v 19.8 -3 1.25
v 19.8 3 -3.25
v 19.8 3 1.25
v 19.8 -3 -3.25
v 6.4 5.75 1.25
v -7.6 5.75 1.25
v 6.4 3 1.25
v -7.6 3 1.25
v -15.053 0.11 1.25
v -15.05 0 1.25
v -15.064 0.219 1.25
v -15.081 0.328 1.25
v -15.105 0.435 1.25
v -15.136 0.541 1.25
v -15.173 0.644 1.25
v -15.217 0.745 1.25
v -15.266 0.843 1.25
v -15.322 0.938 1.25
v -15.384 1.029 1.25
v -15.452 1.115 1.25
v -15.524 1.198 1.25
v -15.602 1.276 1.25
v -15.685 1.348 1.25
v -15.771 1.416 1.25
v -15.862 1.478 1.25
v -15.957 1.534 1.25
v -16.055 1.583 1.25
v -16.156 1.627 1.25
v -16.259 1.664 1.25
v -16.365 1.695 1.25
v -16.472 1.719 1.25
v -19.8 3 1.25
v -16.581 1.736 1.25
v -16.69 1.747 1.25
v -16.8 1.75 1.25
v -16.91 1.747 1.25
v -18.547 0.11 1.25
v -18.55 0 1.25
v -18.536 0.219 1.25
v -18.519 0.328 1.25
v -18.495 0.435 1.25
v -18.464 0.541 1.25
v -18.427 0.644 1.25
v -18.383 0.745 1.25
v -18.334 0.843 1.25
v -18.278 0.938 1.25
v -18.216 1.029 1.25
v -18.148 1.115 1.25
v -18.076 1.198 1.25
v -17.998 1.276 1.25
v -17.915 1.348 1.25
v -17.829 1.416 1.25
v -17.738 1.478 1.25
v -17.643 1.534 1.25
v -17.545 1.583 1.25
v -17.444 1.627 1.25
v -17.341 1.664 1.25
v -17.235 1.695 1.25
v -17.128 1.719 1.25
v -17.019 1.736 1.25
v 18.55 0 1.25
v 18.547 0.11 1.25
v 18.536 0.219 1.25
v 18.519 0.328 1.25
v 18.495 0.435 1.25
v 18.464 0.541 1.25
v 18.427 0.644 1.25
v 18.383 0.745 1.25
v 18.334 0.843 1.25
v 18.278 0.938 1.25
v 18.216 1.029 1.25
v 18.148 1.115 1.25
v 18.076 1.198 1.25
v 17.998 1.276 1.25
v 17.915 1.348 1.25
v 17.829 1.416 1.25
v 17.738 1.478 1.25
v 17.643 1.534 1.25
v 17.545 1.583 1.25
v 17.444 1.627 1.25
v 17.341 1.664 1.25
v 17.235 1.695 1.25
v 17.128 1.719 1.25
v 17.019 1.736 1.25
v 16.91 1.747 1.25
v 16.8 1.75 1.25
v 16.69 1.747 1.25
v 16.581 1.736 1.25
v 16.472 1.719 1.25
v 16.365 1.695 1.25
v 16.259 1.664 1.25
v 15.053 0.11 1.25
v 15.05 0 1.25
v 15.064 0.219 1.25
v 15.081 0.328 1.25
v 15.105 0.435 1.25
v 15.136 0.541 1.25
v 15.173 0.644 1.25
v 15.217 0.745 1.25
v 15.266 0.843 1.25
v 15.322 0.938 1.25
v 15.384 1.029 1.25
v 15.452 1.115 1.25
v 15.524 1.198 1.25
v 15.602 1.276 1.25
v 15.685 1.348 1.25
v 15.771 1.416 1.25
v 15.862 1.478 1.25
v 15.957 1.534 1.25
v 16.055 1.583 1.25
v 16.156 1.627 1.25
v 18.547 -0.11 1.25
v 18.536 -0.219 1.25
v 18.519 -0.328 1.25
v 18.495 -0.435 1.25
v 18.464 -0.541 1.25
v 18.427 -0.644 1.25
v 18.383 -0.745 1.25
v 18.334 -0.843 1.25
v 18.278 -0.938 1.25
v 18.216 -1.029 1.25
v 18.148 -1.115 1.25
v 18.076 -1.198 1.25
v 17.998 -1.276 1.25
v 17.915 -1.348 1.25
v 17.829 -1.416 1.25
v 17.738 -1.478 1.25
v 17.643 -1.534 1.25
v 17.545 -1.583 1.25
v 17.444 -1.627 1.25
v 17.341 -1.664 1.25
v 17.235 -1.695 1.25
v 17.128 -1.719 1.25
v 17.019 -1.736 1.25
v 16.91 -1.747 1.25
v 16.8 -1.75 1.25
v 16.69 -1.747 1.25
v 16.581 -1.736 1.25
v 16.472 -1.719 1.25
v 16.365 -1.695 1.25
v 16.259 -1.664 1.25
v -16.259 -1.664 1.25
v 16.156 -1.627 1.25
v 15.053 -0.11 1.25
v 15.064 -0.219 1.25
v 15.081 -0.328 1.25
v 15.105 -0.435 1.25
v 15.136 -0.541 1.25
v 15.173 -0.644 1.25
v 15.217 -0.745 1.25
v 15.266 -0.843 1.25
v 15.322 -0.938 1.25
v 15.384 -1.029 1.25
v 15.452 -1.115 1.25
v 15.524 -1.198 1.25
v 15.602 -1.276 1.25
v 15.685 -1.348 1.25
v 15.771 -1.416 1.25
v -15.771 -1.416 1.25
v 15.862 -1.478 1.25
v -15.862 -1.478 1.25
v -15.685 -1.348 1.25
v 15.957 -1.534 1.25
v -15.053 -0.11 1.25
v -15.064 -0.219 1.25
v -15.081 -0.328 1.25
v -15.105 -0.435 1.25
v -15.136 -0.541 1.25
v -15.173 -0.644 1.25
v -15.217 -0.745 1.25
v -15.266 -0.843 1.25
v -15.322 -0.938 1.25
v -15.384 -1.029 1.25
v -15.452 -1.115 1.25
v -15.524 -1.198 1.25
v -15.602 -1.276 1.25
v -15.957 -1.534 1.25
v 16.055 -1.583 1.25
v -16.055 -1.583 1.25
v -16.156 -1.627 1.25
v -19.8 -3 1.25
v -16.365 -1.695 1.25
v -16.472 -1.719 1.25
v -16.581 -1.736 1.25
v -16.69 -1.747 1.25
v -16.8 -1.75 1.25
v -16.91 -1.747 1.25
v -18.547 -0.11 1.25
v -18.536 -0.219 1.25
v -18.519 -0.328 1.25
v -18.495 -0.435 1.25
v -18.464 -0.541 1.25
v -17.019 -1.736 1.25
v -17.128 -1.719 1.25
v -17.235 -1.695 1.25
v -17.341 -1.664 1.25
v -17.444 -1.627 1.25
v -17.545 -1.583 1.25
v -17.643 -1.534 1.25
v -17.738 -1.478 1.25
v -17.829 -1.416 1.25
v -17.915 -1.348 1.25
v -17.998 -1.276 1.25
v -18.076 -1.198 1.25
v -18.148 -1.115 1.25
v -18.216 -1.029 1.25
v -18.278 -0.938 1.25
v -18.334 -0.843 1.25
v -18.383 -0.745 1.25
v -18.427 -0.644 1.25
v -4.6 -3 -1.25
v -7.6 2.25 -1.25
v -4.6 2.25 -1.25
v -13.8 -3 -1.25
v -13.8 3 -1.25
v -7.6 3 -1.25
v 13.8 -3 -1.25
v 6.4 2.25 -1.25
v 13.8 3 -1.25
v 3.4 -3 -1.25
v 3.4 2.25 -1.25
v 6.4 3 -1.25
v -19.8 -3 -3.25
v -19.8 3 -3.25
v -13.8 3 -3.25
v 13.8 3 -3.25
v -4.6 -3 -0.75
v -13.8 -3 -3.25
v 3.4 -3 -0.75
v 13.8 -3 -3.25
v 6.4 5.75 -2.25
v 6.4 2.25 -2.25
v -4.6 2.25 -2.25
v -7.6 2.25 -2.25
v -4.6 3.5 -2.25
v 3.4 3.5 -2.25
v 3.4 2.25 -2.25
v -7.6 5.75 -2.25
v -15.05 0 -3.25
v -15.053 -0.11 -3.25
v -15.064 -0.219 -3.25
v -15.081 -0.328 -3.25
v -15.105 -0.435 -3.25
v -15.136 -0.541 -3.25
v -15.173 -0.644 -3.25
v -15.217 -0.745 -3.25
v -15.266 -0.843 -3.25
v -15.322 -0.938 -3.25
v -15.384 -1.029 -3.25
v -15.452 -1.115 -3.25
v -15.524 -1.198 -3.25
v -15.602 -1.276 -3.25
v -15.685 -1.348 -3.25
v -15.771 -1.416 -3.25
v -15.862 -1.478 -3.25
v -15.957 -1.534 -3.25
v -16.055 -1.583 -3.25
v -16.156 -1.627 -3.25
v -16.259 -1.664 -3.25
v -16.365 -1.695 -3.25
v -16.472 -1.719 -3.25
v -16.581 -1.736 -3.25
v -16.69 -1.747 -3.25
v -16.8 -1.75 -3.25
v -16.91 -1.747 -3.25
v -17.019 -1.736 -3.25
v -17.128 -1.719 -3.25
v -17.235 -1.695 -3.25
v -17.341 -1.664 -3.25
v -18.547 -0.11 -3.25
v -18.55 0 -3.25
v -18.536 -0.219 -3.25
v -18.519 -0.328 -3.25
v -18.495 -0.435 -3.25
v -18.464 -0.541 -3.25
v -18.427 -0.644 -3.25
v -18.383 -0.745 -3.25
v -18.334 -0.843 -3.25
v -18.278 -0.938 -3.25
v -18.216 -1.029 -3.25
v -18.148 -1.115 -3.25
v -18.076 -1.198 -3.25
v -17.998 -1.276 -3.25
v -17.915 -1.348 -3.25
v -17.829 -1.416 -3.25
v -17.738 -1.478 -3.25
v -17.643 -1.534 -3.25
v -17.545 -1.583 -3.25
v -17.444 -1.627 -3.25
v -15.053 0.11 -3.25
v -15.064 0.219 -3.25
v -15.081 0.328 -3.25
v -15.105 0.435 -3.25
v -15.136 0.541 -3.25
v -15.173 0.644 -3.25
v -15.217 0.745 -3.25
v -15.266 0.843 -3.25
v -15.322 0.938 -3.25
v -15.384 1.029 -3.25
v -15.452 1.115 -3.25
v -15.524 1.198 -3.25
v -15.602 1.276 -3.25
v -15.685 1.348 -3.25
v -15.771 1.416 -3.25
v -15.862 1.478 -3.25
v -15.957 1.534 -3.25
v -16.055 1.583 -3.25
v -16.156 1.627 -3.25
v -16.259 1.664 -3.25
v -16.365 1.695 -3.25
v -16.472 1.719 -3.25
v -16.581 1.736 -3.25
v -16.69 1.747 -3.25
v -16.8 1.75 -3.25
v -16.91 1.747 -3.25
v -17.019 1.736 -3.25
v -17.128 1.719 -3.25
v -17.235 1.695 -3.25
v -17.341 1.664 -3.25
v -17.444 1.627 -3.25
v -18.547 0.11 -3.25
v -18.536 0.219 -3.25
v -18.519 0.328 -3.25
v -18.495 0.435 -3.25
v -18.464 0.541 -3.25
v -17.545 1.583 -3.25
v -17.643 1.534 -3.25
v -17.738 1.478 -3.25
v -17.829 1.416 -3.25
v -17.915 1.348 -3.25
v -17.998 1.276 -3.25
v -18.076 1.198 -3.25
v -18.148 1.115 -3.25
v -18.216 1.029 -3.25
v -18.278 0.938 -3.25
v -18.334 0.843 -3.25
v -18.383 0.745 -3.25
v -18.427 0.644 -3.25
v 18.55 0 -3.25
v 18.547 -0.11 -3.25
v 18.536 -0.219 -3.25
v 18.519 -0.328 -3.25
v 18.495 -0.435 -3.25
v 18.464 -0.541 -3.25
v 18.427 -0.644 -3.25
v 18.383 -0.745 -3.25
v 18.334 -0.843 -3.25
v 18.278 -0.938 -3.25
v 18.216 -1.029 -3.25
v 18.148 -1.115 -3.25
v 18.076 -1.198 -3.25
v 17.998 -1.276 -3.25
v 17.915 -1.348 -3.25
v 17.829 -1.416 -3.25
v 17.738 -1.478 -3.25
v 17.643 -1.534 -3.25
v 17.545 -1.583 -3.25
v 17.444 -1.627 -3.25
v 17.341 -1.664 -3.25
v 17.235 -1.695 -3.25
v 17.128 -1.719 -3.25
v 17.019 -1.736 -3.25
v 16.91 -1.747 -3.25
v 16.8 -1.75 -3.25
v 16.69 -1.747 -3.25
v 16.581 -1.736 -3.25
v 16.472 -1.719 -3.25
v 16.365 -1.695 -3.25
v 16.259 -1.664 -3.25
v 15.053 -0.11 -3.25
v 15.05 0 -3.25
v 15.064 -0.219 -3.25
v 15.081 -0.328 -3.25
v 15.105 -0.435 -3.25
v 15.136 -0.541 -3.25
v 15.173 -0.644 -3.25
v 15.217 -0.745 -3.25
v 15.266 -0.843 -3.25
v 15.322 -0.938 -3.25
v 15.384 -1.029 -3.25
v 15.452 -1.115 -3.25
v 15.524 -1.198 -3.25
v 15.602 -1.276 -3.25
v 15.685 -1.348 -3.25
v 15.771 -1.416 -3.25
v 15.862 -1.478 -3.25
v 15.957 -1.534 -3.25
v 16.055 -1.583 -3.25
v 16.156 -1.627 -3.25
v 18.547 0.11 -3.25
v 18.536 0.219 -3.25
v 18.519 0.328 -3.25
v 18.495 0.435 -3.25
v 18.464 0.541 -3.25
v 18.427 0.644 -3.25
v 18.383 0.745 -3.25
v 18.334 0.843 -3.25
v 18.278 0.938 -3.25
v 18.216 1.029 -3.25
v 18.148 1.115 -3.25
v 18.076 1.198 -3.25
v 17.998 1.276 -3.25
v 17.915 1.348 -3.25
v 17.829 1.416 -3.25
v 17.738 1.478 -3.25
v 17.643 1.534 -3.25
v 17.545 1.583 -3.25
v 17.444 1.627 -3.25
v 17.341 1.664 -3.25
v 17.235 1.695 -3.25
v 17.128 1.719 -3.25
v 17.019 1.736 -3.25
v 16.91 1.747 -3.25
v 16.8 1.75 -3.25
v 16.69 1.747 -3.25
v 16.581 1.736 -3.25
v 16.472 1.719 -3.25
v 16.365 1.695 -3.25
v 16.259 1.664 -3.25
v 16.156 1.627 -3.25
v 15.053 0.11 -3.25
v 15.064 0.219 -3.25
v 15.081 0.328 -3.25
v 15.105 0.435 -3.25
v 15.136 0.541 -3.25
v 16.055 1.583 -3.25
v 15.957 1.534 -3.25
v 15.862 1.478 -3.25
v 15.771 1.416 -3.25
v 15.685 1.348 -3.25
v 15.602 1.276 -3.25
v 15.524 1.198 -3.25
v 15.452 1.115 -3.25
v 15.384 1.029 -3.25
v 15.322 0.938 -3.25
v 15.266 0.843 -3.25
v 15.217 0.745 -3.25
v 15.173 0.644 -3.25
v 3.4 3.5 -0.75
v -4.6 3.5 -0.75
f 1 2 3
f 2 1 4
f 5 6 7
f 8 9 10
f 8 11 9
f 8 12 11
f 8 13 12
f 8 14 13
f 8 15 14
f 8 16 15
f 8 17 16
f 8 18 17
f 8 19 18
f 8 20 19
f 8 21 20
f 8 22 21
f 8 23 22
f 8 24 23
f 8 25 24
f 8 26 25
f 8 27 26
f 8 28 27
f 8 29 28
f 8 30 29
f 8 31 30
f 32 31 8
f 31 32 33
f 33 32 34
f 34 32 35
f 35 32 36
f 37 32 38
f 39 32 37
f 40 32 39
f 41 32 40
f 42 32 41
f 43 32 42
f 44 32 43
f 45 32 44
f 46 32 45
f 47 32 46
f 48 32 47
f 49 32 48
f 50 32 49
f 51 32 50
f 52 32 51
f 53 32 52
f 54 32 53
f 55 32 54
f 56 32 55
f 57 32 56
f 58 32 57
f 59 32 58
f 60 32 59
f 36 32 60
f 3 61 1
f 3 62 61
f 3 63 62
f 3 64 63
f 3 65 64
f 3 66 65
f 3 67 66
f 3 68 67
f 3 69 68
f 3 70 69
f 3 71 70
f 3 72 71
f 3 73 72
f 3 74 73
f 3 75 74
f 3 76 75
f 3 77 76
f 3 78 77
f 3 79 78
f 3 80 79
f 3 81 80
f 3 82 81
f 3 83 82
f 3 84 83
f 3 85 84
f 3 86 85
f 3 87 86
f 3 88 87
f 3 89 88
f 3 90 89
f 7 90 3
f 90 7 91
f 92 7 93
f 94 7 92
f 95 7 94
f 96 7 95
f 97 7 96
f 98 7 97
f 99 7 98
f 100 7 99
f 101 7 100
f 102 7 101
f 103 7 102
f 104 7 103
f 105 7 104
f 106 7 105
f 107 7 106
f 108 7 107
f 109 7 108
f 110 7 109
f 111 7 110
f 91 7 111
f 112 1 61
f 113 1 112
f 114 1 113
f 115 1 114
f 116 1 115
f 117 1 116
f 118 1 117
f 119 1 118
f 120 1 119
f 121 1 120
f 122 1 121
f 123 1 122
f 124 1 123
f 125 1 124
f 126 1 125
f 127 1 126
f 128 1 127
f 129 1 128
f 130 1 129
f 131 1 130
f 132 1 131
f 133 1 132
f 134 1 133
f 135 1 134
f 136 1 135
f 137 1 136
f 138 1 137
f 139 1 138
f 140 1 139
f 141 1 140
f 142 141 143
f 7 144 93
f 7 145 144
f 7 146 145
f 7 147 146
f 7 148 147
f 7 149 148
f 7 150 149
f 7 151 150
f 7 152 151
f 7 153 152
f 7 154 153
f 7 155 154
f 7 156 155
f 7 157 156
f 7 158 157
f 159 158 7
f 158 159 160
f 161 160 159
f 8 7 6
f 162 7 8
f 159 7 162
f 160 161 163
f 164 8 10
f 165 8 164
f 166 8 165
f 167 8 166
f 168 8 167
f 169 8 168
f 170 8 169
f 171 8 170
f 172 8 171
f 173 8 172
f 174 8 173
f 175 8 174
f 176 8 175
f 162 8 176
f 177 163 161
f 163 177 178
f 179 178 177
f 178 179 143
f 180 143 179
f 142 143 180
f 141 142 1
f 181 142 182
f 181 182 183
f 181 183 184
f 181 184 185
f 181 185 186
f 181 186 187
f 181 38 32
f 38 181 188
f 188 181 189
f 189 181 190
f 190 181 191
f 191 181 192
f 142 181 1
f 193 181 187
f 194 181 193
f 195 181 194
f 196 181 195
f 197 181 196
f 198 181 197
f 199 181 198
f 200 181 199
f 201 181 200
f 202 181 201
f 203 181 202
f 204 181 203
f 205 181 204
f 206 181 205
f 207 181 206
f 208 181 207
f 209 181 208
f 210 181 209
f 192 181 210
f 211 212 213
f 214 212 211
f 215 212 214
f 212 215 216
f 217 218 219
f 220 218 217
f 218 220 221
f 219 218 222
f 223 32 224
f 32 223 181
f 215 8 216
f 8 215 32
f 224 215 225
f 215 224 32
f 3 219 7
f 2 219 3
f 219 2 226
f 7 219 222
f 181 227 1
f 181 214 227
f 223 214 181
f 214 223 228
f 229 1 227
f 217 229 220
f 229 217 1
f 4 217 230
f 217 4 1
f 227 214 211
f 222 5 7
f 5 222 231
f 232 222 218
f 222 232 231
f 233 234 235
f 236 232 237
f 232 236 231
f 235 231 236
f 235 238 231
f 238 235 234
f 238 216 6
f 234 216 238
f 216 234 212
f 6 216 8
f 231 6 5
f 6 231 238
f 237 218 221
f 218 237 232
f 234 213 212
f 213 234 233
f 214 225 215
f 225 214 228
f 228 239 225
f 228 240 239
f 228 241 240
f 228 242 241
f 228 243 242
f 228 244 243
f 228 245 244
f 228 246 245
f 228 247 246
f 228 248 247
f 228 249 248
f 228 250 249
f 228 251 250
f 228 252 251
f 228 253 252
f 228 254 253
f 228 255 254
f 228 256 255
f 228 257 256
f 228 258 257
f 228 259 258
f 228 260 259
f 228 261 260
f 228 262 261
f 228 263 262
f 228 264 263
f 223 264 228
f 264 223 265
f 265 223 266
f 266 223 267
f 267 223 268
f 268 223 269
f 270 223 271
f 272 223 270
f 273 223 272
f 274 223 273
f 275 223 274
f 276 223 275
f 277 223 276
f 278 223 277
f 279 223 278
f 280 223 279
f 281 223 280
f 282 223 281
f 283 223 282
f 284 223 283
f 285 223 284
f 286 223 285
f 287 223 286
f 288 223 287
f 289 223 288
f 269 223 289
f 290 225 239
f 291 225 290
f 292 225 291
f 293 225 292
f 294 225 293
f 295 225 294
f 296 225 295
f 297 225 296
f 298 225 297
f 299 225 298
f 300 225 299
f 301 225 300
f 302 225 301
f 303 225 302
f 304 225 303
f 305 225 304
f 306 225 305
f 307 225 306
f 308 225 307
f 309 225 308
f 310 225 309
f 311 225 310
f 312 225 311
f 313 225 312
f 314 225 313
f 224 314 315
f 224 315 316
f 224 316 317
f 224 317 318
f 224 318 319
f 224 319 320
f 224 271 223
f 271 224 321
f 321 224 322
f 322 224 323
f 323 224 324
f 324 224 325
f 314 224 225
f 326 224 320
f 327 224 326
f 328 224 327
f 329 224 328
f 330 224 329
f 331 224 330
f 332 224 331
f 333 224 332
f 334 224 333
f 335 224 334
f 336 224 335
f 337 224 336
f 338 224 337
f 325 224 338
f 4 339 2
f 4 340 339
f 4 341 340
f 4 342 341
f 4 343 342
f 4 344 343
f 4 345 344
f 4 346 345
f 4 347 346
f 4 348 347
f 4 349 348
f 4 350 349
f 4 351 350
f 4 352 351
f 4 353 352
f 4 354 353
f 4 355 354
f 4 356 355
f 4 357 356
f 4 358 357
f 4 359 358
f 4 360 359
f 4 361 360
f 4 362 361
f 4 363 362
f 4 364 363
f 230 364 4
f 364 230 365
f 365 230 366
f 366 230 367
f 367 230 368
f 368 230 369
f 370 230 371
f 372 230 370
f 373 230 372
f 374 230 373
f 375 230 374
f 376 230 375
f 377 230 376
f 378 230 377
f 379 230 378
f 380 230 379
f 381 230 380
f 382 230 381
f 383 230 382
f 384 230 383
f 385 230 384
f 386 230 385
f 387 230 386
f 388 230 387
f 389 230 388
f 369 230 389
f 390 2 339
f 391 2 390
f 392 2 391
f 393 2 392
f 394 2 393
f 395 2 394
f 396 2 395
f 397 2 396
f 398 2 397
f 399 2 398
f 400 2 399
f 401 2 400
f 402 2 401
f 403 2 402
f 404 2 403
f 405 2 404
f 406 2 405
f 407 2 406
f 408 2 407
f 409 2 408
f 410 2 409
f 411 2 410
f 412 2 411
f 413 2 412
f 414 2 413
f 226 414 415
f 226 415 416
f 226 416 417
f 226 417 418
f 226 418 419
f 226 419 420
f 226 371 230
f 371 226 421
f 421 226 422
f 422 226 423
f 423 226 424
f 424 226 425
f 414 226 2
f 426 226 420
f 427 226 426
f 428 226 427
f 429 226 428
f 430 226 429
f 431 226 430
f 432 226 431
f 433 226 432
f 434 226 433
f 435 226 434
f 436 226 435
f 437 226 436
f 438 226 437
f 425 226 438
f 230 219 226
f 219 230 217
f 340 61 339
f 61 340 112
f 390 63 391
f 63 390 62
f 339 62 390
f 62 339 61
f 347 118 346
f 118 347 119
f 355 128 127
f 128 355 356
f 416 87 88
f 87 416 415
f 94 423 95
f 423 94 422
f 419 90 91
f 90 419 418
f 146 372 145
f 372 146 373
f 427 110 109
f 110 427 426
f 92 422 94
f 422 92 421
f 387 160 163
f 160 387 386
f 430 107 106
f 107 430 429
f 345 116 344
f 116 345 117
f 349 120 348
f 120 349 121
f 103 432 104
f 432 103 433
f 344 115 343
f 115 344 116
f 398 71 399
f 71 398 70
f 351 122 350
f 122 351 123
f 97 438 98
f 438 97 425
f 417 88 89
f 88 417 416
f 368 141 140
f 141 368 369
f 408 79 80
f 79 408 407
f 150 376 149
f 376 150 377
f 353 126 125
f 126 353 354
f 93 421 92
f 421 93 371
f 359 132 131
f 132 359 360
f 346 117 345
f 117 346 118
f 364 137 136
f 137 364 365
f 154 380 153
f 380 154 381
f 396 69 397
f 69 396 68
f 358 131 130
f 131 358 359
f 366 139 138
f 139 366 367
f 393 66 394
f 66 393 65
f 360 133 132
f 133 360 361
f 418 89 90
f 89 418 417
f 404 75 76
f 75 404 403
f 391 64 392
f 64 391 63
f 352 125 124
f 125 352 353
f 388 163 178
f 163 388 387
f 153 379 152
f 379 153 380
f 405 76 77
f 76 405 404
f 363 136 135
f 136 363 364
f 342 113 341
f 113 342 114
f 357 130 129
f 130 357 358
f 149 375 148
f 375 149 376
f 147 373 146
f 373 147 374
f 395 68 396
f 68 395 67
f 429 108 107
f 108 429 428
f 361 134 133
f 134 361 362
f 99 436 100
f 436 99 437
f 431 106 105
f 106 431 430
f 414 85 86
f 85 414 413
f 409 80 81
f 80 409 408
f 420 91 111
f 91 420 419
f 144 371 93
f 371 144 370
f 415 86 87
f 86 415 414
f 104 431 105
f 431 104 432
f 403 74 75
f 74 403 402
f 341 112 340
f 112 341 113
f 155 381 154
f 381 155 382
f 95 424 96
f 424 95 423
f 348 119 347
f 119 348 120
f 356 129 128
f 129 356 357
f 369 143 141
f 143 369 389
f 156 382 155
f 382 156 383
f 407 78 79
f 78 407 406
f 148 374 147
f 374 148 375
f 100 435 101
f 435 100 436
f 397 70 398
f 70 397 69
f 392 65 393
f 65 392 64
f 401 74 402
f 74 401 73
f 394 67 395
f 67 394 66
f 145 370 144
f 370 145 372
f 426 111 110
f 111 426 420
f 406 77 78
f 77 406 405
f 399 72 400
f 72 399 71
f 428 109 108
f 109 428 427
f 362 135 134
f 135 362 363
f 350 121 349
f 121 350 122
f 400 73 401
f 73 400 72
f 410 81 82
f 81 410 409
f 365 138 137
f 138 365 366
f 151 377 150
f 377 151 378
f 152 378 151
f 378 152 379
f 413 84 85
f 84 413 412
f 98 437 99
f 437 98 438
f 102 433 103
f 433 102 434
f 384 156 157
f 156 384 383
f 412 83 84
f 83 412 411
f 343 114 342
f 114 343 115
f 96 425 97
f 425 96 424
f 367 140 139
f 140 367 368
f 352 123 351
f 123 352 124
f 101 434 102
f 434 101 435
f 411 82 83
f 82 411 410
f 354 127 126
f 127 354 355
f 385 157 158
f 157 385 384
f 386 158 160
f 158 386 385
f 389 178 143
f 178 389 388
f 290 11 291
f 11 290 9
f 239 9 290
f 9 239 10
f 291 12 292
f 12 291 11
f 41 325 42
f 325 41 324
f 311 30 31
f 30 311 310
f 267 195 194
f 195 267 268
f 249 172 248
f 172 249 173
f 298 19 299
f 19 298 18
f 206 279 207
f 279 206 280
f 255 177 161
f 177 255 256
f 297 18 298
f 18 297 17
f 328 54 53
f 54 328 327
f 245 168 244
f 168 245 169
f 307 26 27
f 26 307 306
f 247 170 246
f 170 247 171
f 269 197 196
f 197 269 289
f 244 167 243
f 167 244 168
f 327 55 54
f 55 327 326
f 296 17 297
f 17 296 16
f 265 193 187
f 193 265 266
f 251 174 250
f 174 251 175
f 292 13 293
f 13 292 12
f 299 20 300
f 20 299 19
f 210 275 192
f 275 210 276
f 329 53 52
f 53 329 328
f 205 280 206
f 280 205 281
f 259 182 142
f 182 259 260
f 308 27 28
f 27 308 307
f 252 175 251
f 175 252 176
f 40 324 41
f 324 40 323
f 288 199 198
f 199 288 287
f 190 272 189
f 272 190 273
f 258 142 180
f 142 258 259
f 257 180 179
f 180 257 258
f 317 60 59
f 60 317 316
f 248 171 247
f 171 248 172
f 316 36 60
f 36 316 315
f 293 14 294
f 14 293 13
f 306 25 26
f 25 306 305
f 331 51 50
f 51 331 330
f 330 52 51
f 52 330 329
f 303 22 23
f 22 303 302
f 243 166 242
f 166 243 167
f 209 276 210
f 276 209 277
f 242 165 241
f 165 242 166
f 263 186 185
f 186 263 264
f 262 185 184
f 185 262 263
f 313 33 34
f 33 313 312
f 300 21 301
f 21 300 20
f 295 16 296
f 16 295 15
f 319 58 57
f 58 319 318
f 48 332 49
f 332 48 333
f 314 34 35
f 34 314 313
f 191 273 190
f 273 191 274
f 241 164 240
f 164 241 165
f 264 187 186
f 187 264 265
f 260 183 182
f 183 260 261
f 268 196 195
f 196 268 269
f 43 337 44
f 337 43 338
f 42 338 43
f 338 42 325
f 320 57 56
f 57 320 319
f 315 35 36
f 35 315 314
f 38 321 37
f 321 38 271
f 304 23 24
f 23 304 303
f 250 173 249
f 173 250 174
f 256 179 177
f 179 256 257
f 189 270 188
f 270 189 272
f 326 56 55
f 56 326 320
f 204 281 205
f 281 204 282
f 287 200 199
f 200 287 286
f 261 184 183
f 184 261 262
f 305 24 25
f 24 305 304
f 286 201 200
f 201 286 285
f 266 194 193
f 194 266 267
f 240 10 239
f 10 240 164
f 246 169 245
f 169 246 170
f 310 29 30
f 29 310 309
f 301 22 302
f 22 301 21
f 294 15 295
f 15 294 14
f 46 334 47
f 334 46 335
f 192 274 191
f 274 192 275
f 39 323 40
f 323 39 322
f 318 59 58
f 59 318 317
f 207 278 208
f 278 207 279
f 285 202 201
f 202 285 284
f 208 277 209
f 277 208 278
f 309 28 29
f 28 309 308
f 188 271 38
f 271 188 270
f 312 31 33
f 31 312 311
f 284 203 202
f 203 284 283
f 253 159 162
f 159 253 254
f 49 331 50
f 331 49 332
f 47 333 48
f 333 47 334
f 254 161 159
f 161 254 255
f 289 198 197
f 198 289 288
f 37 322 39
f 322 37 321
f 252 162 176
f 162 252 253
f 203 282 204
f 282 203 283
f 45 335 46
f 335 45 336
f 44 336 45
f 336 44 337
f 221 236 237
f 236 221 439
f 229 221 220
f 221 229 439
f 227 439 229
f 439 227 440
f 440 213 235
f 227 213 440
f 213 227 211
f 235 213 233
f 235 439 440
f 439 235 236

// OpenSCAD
holderB8826D1SubPiece();

/**
 * holderB8826D1SubPiece
 * @name holderB8826D1SubPiece
 * @description One of two holder part
 * @type subPiece
 */
module holderB8826D1SubPiece(
    hole_3mm_correction = 0.5,

    part_holders_width = 7,
    part_holders_height = 2,

    board_width = 25.6,
    depth = 6,
    height = 2.5,
    throws_margin = 3,
    throws_diameter = 3,

    _fn = 100
) {

    throws_diameter_with_correction = throws_diameter + hole_3mm_correction;
    width = board_width + (part_holders_width * 2);
    translate_usb_from_center = ((board_width / 2) - (4 + 9.4));

    increase_usb_fixation_x = 4;
    increase_usb_fixation_y = 1.5;

    difference() {
        union() {
            translate([0, 0, 0])
                cube([width, depth, height], center = true);

            color("green")
            translate([translate_usb_from_center, 4, -0.5])
                cube(
                    [
                        10 + increase_usb_fixation_x,
                        2 + increase_usb_fixation_y,
                        height+1
                    ], center = true);

            translate([- (width / 2) + (6 / 2), 0, -(height / 2) - (part_holders_height / 2)])
                color("red")
                cube([6, depth, part_holders_height], center = true);
 
            translate([(width / 2) - (6 / 2), 0, -(height / 2) - (part_holders_height / 2)])
                color("red")
                cube([6, depth, part_holders_height], center = true);
        }

        translate([width / 2 - throws_margin, 0, 0])
            cylinder(h = (height + part_holders_height) * 2, d = throws_diameter_with_correction, center = true, $fn = _fn);

        translate([- (width / 2) + throws_margin, 0, 0])
            cylinder(h = (height + part_holders_height) * 2, d = throws_diameter_with_correction, center = true, $fn = _fn);

        translate([translate_usb_from_center, 0 + 0.25 -0.5, -2])
            cube([8, 7.5, height], center = true);
    }
}
